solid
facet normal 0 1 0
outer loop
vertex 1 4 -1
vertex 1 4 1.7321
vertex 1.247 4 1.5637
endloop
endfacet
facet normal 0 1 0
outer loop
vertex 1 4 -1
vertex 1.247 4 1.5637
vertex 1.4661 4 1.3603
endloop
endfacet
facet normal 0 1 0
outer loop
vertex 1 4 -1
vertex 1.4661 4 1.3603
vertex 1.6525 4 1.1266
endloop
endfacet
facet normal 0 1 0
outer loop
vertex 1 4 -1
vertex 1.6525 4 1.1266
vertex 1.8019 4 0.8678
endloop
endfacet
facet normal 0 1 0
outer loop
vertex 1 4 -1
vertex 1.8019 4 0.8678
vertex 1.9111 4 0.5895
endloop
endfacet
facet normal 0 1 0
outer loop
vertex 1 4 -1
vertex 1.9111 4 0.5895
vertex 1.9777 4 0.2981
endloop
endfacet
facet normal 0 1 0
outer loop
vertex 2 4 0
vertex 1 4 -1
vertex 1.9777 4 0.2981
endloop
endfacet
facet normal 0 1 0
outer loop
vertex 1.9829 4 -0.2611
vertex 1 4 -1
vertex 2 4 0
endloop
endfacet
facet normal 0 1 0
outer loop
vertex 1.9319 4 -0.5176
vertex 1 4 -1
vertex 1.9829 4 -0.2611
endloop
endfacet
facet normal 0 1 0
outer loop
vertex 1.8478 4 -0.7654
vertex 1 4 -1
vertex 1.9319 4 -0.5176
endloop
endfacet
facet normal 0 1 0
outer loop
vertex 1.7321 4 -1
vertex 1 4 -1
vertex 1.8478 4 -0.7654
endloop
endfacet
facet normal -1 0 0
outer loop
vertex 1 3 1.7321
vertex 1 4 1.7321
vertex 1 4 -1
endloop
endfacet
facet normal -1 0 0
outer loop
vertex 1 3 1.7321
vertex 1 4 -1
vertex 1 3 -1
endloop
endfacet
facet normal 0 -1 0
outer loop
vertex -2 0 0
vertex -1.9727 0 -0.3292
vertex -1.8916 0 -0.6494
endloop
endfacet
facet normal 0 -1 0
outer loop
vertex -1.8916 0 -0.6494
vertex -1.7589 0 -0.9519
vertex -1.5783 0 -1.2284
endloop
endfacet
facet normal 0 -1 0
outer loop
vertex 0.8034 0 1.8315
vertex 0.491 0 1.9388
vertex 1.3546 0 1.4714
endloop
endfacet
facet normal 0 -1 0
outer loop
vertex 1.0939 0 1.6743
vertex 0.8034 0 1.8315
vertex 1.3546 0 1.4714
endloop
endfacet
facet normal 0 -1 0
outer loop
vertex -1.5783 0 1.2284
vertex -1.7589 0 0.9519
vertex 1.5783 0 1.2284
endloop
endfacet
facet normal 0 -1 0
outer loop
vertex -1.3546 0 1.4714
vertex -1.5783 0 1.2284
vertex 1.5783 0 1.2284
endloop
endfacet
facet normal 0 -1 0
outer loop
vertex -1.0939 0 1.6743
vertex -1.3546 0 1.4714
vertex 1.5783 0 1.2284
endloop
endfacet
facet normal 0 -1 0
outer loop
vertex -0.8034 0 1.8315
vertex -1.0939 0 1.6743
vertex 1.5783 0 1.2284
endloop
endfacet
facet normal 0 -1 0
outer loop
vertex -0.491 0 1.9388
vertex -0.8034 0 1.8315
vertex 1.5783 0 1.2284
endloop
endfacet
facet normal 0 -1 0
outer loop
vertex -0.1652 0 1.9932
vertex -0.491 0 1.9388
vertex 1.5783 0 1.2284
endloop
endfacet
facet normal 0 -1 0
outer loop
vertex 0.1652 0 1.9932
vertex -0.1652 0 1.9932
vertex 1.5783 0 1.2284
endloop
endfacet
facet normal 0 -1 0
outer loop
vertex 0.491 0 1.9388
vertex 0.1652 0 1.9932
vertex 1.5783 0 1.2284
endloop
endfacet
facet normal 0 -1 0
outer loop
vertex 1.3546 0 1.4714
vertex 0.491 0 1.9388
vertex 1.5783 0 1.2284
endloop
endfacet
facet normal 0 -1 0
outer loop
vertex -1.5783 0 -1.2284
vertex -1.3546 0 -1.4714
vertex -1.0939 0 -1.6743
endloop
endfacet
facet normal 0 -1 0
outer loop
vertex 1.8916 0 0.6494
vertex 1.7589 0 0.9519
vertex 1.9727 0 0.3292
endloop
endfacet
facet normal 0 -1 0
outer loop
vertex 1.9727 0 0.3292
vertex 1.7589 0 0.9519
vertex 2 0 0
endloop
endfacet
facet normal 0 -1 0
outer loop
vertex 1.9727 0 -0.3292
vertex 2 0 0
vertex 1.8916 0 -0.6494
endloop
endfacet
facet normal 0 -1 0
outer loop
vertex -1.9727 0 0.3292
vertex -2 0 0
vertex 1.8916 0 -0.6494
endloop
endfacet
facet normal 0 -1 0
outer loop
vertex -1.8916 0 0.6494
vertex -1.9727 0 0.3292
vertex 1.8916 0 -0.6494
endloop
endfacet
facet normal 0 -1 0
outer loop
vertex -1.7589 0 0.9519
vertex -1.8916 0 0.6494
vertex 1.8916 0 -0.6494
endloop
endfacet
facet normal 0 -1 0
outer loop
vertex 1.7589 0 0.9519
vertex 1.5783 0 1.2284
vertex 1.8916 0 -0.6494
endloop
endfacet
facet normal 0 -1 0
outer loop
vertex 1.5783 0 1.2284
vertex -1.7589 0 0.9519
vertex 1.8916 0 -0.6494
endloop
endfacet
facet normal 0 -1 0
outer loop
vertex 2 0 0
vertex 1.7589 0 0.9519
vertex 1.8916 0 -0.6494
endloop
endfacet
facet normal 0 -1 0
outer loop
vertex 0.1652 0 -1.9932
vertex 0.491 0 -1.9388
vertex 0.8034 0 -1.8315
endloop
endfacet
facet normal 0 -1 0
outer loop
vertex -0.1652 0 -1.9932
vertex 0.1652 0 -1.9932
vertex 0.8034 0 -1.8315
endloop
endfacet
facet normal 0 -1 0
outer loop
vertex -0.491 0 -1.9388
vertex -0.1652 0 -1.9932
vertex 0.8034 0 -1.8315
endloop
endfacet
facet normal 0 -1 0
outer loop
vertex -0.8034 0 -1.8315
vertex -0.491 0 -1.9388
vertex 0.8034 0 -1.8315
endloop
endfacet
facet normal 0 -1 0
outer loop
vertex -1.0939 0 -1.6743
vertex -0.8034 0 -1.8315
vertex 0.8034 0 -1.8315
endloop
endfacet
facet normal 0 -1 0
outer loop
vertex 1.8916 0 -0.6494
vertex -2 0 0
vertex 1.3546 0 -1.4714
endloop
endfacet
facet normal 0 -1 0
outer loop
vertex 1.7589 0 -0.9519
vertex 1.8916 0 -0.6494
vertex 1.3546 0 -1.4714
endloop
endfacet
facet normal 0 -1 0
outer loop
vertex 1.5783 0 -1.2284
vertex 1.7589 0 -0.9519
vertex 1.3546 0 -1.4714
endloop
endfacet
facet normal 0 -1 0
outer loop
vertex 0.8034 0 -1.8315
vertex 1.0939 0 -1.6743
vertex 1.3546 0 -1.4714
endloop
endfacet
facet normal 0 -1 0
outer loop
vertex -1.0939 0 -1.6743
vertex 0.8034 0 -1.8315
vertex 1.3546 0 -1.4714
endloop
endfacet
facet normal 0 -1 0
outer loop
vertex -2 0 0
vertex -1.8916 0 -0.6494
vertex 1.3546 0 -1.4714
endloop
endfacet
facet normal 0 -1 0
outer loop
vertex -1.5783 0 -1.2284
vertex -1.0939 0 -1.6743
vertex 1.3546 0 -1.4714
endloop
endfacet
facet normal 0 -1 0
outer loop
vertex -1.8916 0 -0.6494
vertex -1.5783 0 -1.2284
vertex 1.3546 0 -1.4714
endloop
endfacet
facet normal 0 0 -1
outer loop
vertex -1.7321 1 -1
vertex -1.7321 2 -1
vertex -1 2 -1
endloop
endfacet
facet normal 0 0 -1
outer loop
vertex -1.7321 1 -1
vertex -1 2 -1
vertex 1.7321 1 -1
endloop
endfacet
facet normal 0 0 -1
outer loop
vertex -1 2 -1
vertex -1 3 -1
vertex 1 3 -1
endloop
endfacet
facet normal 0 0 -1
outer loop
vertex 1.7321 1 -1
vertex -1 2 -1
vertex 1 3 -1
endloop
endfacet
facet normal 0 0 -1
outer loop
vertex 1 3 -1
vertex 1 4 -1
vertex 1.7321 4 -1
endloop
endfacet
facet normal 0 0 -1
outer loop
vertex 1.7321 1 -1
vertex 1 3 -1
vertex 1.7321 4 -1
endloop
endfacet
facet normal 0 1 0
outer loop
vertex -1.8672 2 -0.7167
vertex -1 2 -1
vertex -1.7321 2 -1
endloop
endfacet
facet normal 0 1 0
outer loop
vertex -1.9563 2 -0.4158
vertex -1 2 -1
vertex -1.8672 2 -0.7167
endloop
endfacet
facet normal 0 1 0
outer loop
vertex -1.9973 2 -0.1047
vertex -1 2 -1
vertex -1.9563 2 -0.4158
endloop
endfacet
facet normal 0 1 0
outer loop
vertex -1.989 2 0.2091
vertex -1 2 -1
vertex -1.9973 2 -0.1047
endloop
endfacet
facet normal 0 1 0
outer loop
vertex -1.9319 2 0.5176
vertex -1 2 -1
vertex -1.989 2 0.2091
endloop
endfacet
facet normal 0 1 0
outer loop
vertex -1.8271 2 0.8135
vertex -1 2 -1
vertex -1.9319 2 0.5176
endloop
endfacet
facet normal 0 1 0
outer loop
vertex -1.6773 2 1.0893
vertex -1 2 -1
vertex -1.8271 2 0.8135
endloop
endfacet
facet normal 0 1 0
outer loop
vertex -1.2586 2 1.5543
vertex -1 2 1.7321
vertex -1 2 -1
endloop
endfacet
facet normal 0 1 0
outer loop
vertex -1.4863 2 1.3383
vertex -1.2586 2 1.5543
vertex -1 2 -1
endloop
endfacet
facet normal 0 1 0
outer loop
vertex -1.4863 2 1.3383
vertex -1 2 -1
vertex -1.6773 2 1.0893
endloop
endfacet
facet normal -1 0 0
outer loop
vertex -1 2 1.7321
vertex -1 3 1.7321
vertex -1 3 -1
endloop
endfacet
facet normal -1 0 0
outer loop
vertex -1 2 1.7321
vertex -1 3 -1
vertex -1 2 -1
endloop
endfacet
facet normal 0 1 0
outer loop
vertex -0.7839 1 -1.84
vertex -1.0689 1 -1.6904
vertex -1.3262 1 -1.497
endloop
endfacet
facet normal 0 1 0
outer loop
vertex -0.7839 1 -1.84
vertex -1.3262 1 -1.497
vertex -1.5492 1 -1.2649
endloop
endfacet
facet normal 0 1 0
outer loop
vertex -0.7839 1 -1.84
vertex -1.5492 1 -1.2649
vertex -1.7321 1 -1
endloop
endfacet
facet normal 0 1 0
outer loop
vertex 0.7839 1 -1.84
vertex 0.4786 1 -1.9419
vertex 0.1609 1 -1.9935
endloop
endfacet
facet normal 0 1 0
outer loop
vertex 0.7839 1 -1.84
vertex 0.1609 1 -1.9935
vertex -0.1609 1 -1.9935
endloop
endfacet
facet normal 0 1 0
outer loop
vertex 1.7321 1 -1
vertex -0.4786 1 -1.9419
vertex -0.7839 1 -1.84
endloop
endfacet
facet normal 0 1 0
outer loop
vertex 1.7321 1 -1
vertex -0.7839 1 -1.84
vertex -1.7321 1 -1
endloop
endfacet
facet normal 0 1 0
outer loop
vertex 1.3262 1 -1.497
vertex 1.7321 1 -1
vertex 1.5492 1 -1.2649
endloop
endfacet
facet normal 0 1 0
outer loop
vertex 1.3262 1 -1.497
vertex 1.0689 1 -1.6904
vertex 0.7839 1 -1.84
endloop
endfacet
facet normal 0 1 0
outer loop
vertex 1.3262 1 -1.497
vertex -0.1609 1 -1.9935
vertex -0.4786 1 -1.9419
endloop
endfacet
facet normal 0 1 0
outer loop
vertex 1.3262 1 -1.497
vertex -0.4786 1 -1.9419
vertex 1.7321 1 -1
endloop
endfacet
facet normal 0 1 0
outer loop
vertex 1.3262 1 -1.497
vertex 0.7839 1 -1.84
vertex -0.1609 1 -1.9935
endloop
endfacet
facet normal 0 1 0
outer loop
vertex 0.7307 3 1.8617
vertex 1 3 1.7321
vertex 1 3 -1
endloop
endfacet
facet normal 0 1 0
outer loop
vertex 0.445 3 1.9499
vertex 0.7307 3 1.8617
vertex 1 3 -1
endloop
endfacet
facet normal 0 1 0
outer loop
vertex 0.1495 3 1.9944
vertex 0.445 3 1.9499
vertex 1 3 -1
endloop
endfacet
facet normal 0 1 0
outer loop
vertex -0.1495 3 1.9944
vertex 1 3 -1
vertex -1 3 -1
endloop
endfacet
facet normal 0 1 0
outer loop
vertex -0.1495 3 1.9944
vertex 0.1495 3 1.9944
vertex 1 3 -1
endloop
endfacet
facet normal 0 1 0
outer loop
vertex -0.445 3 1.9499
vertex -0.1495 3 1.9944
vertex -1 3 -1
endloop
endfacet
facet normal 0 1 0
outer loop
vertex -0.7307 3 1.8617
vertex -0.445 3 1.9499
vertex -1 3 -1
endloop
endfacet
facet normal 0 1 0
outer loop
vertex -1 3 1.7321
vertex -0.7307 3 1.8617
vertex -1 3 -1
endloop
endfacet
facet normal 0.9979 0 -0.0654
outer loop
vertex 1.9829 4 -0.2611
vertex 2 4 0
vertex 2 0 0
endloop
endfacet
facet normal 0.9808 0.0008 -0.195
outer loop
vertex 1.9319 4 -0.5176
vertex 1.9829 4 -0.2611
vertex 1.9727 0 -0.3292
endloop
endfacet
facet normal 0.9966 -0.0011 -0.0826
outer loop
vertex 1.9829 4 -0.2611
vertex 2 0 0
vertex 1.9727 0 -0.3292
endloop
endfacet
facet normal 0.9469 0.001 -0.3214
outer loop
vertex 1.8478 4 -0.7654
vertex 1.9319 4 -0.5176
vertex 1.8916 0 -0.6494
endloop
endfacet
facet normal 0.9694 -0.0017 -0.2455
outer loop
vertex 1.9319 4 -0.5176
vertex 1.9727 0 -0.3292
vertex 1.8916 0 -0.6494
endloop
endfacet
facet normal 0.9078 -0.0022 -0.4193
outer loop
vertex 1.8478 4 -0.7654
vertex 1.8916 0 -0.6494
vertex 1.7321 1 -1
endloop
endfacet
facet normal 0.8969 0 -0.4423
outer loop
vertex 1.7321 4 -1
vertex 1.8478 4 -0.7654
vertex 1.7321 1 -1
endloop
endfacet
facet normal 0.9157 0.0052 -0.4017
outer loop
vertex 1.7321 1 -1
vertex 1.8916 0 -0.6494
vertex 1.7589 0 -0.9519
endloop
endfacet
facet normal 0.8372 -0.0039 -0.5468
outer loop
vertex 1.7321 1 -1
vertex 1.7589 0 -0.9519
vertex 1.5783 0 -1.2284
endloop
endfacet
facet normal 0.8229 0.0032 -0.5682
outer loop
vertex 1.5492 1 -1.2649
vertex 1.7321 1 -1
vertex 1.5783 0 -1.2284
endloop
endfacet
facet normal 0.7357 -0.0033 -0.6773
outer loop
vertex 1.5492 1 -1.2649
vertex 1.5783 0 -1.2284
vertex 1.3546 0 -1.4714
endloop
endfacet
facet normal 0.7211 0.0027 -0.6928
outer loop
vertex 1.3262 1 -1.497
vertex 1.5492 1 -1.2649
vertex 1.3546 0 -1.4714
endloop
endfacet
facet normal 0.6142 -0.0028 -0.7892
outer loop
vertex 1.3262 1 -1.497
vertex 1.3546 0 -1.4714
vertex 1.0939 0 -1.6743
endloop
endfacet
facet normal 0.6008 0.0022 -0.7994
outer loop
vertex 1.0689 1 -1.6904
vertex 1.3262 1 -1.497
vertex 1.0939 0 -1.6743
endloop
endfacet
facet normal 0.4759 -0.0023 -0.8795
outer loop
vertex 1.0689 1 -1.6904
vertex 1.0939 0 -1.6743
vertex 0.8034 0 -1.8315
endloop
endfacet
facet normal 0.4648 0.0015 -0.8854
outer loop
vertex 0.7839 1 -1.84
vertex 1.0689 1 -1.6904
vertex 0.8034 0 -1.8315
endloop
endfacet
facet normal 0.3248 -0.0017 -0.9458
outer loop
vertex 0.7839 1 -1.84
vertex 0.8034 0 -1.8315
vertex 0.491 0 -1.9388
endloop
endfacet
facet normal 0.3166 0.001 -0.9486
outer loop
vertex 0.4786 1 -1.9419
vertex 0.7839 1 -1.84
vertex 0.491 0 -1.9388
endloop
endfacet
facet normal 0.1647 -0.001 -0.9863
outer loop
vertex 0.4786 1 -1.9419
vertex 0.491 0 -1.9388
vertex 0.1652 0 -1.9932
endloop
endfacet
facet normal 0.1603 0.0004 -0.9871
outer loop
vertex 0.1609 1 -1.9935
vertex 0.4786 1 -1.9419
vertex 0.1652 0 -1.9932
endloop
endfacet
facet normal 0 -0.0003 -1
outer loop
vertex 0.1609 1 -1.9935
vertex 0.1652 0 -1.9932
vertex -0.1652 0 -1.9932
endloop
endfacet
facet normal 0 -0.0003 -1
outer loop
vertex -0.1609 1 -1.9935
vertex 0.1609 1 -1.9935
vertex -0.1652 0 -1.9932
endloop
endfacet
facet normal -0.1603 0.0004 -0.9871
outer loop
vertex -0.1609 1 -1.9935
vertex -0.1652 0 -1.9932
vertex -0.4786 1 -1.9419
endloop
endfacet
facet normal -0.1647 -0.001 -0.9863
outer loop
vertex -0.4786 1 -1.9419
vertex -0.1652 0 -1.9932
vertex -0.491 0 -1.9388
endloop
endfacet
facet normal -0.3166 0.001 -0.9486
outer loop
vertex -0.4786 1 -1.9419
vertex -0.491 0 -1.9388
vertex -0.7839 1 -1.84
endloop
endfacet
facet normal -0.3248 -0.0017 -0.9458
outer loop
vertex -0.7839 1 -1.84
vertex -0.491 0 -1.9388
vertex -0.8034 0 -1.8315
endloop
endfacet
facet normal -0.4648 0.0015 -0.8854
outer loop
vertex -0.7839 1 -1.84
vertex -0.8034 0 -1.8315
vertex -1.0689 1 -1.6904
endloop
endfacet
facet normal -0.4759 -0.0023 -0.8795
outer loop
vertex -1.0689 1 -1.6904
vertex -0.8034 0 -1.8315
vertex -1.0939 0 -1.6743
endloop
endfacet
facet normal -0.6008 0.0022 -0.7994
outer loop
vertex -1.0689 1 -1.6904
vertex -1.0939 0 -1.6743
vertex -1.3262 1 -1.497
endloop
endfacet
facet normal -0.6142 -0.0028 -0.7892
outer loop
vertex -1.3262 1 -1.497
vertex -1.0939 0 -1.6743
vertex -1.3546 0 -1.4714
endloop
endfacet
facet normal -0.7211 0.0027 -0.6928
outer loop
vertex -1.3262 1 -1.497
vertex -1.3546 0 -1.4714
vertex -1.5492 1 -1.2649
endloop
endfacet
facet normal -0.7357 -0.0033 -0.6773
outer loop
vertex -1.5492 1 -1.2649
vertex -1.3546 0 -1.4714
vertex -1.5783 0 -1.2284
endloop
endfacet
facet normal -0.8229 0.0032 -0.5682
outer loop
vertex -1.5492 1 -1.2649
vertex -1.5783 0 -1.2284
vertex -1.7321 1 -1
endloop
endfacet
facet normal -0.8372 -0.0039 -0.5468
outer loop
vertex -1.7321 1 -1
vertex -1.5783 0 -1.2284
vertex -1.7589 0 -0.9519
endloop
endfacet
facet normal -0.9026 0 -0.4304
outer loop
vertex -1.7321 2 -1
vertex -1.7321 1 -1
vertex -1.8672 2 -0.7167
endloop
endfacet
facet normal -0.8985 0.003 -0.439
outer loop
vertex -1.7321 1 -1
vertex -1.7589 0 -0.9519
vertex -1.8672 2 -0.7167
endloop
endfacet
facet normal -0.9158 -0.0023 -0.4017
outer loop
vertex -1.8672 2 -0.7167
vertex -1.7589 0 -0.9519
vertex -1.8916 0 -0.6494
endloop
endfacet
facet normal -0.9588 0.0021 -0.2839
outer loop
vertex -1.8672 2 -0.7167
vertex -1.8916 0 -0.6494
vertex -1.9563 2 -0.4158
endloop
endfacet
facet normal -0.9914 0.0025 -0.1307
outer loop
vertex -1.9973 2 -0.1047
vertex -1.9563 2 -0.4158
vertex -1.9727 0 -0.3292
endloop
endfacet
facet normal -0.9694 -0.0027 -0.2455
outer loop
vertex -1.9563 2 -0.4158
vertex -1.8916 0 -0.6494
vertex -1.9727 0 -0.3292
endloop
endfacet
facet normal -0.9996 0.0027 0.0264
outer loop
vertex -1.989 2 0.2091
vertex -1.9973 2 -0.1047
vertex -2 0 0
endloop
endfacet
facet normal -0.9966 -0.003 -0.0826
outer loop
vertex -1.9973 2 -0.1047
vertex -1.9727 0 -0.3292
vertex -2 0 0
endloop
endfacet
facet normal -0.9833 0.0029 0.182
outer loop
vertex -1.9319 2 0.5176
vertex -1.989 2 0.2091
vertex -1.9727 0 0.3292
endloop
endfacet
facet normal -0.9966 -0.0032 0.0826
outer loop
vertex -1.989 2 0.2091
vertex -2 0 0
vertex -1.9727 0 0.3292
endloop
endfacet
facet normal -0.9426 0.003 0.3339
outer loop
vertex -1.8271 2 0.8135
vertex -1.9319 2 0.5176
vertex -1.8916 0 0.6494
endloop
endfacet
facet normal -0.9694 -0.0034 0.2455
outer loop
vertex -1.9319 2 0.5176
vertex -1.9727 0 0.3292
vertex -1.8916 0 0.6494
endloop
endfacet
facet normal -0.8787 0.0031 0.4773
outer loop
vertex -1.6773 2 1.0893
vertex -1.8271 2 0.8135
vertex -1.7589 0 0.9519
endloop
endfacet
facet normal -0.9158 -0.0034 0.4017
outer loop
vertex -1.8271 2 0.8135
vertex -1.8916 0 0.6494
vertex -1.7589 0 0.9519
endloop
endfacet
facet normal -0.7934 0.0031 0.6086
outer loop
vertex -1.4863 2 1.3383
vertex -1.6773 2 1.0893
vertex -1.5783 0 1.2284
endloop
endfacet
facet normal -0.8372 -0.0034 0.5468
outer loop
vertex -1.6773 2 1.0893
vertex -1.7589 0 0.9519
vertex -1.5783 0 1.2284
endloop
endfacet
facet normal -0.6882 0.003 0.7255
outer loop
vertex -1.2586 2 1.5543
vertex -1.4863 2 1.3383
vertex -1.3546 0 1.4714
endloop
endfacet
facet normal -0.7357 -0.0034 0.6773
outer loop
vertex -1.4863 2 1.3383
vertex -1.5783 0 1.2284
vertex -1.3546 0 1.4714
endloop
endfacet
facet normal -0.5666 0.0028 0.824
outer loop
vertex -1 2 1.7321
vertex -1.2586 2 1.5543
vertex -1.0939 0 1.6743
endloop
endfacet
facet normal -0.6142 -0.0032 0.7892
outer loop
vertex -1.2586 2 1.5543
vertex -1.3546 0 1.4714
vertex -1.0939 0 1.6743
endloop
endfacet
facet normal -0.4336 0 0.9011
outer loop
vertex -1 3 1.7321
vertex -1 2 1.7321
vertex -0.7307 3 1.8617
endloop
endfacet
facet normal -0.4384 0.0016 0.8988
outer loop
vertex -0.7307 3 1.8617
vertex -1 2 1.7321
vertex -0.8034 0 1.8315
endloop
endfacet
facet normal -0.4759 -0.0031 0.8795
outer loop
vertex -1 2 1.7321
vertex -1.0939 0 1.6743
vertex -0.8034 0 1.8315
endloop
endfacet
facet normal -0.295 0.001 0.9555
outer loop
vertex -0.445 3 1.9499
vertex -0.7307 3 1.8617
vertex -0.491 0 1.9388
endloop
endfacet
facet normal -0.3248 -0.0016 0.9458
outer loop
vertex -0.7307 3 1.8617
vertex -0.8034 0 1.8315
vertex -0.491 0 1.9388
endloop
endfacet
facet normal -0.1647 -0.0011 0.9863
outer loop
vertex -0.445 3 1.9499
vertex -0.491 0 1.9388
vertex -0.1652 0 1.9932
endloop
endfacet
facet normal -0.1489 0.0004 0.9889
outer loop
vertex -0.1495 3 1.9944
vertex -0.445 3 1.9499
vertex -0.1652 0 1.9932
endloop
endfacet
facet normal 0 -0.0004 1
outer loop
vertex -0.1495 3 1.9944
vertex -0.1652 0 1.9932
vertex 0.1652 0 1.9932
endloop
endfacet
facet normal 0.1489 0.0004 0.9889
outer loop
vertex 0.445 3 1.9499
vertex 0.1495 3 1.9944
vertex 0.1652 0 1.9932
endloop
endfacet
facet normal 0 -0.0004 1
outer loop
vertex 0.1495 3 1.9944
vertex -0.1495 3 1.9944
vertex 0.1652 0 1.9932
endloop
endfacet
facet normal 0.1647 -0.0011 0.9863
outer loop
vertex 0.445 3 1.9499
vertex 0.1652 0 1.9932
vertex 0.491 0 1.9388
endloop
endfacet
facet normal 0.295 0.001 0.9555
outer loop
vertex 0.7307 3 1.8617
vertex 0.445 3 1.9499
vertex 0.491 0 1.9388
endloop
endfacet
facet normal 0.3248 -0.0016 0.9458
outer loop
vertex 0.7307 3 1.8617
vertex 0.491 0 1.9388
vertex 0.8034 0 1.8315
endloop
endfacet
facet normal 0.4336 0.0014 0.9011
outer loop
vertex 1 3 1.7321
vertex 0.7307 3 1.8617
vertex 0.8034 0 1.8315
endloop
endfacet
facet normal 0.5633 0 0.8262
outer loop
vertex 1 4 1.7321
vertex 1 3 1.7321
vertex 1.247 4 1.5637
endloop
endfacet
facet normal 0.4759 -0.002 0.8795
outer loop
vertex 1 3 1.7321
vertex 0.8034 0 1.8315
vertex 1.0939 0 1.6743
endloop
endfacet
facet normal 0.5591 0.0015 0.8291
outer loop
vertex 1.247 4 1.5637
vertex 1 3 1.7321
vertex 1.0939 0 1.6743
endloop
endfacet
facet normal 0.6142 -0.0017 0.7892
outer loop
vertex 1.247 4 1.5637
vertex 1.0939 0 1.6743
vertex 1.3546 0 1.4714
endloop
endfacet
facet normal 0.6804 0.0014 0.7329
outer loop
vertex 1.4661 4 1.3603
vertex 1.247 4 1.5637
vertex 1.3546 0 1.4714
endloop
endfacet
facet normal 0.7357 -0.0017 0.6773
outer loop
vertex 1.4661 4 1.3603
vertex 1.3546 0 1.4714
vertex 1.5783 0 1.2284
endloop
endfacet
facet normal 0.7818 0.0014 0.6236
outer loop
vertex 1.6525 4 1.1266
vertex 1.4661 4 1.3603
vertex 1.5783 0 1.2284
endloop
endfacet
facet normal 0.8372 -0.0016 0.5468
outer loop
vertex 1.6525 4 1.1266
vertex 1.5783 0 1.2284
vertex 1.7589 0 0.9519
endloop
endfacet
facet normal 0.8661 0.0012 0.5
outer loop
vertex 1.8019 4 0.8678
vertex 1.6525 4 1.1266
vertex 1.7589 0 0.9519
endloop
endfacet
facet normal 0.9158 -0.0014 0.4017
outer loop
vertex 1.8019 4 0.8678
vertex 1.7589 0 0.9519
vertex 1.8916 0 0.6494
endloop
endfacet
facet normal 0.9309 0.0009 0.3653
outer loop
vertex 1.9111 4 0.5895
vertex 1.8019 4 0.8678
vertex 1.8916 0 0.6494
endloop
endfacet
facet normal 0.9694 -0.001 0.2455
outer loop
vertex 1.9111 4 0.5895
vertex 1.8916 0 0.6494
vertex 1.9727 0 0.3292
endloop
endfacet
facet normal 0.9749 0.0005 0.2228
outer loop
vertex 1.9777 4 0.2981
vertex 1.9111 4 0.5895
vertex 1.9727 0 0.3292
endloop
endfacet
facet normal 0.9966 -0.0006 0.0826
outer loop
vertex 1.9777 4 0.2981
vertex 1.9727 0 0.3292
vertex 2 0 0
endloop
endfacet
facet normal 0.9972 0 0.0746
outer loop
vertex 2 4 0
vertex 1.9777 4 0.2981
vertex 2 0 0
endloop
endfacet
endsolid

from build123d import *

# Parameters (mm, degrees)
SKETCH1_R           = 2
BOSS_EXTRUDE1_DEPTH = 4
CUT_EXTRUDE1_DEPTH  = 2
CUT_EXTRUDE2_DEPTH  = 3


with BuildPart() as part:
    # Sketch1 → Boss-Extrude1 (new body)
    with BuildSketch(Plane(origin=(0, 0, 0), x_dir=(1, 0, 0), z_dir=(0, 1, 0))):
        Circle(SKETCH1_R)
    extrude(amount=BOSS_EXTRUDE1_DEPTH)

    # Sketch2 → Cut-Extrude1 (cut, symmetric)
    with BuildSketch(Plane.XY):
        Polygon((1, 4), (1, 3), (-1, 3), (-1, 2), (-2, 2), (-2, 4), align=None)
    extrude(amount=CUT_EXTRUDE1_DEPTH, both=True, mode=Mode.SUBTRACT)

    # Sketch3 → Cut-Extrude2 (cut)
    with BuildSketch(Plane(origin=(0, 4, 0), x_dir=(1, 0, 0), z_dir=(0, 1, 0))):
        with BuildLine():
            Line((-1.732050808, 1), (1.732050808, 1))
            ThreePointArc((1.732050808, 1), (0, 2), (-1.732050808, 1))
        make_face()
    extrude(amount=-CUT_EXTRUDE2_DEPTH, mode=Mode.SUBTRACT)


solid = part.part
